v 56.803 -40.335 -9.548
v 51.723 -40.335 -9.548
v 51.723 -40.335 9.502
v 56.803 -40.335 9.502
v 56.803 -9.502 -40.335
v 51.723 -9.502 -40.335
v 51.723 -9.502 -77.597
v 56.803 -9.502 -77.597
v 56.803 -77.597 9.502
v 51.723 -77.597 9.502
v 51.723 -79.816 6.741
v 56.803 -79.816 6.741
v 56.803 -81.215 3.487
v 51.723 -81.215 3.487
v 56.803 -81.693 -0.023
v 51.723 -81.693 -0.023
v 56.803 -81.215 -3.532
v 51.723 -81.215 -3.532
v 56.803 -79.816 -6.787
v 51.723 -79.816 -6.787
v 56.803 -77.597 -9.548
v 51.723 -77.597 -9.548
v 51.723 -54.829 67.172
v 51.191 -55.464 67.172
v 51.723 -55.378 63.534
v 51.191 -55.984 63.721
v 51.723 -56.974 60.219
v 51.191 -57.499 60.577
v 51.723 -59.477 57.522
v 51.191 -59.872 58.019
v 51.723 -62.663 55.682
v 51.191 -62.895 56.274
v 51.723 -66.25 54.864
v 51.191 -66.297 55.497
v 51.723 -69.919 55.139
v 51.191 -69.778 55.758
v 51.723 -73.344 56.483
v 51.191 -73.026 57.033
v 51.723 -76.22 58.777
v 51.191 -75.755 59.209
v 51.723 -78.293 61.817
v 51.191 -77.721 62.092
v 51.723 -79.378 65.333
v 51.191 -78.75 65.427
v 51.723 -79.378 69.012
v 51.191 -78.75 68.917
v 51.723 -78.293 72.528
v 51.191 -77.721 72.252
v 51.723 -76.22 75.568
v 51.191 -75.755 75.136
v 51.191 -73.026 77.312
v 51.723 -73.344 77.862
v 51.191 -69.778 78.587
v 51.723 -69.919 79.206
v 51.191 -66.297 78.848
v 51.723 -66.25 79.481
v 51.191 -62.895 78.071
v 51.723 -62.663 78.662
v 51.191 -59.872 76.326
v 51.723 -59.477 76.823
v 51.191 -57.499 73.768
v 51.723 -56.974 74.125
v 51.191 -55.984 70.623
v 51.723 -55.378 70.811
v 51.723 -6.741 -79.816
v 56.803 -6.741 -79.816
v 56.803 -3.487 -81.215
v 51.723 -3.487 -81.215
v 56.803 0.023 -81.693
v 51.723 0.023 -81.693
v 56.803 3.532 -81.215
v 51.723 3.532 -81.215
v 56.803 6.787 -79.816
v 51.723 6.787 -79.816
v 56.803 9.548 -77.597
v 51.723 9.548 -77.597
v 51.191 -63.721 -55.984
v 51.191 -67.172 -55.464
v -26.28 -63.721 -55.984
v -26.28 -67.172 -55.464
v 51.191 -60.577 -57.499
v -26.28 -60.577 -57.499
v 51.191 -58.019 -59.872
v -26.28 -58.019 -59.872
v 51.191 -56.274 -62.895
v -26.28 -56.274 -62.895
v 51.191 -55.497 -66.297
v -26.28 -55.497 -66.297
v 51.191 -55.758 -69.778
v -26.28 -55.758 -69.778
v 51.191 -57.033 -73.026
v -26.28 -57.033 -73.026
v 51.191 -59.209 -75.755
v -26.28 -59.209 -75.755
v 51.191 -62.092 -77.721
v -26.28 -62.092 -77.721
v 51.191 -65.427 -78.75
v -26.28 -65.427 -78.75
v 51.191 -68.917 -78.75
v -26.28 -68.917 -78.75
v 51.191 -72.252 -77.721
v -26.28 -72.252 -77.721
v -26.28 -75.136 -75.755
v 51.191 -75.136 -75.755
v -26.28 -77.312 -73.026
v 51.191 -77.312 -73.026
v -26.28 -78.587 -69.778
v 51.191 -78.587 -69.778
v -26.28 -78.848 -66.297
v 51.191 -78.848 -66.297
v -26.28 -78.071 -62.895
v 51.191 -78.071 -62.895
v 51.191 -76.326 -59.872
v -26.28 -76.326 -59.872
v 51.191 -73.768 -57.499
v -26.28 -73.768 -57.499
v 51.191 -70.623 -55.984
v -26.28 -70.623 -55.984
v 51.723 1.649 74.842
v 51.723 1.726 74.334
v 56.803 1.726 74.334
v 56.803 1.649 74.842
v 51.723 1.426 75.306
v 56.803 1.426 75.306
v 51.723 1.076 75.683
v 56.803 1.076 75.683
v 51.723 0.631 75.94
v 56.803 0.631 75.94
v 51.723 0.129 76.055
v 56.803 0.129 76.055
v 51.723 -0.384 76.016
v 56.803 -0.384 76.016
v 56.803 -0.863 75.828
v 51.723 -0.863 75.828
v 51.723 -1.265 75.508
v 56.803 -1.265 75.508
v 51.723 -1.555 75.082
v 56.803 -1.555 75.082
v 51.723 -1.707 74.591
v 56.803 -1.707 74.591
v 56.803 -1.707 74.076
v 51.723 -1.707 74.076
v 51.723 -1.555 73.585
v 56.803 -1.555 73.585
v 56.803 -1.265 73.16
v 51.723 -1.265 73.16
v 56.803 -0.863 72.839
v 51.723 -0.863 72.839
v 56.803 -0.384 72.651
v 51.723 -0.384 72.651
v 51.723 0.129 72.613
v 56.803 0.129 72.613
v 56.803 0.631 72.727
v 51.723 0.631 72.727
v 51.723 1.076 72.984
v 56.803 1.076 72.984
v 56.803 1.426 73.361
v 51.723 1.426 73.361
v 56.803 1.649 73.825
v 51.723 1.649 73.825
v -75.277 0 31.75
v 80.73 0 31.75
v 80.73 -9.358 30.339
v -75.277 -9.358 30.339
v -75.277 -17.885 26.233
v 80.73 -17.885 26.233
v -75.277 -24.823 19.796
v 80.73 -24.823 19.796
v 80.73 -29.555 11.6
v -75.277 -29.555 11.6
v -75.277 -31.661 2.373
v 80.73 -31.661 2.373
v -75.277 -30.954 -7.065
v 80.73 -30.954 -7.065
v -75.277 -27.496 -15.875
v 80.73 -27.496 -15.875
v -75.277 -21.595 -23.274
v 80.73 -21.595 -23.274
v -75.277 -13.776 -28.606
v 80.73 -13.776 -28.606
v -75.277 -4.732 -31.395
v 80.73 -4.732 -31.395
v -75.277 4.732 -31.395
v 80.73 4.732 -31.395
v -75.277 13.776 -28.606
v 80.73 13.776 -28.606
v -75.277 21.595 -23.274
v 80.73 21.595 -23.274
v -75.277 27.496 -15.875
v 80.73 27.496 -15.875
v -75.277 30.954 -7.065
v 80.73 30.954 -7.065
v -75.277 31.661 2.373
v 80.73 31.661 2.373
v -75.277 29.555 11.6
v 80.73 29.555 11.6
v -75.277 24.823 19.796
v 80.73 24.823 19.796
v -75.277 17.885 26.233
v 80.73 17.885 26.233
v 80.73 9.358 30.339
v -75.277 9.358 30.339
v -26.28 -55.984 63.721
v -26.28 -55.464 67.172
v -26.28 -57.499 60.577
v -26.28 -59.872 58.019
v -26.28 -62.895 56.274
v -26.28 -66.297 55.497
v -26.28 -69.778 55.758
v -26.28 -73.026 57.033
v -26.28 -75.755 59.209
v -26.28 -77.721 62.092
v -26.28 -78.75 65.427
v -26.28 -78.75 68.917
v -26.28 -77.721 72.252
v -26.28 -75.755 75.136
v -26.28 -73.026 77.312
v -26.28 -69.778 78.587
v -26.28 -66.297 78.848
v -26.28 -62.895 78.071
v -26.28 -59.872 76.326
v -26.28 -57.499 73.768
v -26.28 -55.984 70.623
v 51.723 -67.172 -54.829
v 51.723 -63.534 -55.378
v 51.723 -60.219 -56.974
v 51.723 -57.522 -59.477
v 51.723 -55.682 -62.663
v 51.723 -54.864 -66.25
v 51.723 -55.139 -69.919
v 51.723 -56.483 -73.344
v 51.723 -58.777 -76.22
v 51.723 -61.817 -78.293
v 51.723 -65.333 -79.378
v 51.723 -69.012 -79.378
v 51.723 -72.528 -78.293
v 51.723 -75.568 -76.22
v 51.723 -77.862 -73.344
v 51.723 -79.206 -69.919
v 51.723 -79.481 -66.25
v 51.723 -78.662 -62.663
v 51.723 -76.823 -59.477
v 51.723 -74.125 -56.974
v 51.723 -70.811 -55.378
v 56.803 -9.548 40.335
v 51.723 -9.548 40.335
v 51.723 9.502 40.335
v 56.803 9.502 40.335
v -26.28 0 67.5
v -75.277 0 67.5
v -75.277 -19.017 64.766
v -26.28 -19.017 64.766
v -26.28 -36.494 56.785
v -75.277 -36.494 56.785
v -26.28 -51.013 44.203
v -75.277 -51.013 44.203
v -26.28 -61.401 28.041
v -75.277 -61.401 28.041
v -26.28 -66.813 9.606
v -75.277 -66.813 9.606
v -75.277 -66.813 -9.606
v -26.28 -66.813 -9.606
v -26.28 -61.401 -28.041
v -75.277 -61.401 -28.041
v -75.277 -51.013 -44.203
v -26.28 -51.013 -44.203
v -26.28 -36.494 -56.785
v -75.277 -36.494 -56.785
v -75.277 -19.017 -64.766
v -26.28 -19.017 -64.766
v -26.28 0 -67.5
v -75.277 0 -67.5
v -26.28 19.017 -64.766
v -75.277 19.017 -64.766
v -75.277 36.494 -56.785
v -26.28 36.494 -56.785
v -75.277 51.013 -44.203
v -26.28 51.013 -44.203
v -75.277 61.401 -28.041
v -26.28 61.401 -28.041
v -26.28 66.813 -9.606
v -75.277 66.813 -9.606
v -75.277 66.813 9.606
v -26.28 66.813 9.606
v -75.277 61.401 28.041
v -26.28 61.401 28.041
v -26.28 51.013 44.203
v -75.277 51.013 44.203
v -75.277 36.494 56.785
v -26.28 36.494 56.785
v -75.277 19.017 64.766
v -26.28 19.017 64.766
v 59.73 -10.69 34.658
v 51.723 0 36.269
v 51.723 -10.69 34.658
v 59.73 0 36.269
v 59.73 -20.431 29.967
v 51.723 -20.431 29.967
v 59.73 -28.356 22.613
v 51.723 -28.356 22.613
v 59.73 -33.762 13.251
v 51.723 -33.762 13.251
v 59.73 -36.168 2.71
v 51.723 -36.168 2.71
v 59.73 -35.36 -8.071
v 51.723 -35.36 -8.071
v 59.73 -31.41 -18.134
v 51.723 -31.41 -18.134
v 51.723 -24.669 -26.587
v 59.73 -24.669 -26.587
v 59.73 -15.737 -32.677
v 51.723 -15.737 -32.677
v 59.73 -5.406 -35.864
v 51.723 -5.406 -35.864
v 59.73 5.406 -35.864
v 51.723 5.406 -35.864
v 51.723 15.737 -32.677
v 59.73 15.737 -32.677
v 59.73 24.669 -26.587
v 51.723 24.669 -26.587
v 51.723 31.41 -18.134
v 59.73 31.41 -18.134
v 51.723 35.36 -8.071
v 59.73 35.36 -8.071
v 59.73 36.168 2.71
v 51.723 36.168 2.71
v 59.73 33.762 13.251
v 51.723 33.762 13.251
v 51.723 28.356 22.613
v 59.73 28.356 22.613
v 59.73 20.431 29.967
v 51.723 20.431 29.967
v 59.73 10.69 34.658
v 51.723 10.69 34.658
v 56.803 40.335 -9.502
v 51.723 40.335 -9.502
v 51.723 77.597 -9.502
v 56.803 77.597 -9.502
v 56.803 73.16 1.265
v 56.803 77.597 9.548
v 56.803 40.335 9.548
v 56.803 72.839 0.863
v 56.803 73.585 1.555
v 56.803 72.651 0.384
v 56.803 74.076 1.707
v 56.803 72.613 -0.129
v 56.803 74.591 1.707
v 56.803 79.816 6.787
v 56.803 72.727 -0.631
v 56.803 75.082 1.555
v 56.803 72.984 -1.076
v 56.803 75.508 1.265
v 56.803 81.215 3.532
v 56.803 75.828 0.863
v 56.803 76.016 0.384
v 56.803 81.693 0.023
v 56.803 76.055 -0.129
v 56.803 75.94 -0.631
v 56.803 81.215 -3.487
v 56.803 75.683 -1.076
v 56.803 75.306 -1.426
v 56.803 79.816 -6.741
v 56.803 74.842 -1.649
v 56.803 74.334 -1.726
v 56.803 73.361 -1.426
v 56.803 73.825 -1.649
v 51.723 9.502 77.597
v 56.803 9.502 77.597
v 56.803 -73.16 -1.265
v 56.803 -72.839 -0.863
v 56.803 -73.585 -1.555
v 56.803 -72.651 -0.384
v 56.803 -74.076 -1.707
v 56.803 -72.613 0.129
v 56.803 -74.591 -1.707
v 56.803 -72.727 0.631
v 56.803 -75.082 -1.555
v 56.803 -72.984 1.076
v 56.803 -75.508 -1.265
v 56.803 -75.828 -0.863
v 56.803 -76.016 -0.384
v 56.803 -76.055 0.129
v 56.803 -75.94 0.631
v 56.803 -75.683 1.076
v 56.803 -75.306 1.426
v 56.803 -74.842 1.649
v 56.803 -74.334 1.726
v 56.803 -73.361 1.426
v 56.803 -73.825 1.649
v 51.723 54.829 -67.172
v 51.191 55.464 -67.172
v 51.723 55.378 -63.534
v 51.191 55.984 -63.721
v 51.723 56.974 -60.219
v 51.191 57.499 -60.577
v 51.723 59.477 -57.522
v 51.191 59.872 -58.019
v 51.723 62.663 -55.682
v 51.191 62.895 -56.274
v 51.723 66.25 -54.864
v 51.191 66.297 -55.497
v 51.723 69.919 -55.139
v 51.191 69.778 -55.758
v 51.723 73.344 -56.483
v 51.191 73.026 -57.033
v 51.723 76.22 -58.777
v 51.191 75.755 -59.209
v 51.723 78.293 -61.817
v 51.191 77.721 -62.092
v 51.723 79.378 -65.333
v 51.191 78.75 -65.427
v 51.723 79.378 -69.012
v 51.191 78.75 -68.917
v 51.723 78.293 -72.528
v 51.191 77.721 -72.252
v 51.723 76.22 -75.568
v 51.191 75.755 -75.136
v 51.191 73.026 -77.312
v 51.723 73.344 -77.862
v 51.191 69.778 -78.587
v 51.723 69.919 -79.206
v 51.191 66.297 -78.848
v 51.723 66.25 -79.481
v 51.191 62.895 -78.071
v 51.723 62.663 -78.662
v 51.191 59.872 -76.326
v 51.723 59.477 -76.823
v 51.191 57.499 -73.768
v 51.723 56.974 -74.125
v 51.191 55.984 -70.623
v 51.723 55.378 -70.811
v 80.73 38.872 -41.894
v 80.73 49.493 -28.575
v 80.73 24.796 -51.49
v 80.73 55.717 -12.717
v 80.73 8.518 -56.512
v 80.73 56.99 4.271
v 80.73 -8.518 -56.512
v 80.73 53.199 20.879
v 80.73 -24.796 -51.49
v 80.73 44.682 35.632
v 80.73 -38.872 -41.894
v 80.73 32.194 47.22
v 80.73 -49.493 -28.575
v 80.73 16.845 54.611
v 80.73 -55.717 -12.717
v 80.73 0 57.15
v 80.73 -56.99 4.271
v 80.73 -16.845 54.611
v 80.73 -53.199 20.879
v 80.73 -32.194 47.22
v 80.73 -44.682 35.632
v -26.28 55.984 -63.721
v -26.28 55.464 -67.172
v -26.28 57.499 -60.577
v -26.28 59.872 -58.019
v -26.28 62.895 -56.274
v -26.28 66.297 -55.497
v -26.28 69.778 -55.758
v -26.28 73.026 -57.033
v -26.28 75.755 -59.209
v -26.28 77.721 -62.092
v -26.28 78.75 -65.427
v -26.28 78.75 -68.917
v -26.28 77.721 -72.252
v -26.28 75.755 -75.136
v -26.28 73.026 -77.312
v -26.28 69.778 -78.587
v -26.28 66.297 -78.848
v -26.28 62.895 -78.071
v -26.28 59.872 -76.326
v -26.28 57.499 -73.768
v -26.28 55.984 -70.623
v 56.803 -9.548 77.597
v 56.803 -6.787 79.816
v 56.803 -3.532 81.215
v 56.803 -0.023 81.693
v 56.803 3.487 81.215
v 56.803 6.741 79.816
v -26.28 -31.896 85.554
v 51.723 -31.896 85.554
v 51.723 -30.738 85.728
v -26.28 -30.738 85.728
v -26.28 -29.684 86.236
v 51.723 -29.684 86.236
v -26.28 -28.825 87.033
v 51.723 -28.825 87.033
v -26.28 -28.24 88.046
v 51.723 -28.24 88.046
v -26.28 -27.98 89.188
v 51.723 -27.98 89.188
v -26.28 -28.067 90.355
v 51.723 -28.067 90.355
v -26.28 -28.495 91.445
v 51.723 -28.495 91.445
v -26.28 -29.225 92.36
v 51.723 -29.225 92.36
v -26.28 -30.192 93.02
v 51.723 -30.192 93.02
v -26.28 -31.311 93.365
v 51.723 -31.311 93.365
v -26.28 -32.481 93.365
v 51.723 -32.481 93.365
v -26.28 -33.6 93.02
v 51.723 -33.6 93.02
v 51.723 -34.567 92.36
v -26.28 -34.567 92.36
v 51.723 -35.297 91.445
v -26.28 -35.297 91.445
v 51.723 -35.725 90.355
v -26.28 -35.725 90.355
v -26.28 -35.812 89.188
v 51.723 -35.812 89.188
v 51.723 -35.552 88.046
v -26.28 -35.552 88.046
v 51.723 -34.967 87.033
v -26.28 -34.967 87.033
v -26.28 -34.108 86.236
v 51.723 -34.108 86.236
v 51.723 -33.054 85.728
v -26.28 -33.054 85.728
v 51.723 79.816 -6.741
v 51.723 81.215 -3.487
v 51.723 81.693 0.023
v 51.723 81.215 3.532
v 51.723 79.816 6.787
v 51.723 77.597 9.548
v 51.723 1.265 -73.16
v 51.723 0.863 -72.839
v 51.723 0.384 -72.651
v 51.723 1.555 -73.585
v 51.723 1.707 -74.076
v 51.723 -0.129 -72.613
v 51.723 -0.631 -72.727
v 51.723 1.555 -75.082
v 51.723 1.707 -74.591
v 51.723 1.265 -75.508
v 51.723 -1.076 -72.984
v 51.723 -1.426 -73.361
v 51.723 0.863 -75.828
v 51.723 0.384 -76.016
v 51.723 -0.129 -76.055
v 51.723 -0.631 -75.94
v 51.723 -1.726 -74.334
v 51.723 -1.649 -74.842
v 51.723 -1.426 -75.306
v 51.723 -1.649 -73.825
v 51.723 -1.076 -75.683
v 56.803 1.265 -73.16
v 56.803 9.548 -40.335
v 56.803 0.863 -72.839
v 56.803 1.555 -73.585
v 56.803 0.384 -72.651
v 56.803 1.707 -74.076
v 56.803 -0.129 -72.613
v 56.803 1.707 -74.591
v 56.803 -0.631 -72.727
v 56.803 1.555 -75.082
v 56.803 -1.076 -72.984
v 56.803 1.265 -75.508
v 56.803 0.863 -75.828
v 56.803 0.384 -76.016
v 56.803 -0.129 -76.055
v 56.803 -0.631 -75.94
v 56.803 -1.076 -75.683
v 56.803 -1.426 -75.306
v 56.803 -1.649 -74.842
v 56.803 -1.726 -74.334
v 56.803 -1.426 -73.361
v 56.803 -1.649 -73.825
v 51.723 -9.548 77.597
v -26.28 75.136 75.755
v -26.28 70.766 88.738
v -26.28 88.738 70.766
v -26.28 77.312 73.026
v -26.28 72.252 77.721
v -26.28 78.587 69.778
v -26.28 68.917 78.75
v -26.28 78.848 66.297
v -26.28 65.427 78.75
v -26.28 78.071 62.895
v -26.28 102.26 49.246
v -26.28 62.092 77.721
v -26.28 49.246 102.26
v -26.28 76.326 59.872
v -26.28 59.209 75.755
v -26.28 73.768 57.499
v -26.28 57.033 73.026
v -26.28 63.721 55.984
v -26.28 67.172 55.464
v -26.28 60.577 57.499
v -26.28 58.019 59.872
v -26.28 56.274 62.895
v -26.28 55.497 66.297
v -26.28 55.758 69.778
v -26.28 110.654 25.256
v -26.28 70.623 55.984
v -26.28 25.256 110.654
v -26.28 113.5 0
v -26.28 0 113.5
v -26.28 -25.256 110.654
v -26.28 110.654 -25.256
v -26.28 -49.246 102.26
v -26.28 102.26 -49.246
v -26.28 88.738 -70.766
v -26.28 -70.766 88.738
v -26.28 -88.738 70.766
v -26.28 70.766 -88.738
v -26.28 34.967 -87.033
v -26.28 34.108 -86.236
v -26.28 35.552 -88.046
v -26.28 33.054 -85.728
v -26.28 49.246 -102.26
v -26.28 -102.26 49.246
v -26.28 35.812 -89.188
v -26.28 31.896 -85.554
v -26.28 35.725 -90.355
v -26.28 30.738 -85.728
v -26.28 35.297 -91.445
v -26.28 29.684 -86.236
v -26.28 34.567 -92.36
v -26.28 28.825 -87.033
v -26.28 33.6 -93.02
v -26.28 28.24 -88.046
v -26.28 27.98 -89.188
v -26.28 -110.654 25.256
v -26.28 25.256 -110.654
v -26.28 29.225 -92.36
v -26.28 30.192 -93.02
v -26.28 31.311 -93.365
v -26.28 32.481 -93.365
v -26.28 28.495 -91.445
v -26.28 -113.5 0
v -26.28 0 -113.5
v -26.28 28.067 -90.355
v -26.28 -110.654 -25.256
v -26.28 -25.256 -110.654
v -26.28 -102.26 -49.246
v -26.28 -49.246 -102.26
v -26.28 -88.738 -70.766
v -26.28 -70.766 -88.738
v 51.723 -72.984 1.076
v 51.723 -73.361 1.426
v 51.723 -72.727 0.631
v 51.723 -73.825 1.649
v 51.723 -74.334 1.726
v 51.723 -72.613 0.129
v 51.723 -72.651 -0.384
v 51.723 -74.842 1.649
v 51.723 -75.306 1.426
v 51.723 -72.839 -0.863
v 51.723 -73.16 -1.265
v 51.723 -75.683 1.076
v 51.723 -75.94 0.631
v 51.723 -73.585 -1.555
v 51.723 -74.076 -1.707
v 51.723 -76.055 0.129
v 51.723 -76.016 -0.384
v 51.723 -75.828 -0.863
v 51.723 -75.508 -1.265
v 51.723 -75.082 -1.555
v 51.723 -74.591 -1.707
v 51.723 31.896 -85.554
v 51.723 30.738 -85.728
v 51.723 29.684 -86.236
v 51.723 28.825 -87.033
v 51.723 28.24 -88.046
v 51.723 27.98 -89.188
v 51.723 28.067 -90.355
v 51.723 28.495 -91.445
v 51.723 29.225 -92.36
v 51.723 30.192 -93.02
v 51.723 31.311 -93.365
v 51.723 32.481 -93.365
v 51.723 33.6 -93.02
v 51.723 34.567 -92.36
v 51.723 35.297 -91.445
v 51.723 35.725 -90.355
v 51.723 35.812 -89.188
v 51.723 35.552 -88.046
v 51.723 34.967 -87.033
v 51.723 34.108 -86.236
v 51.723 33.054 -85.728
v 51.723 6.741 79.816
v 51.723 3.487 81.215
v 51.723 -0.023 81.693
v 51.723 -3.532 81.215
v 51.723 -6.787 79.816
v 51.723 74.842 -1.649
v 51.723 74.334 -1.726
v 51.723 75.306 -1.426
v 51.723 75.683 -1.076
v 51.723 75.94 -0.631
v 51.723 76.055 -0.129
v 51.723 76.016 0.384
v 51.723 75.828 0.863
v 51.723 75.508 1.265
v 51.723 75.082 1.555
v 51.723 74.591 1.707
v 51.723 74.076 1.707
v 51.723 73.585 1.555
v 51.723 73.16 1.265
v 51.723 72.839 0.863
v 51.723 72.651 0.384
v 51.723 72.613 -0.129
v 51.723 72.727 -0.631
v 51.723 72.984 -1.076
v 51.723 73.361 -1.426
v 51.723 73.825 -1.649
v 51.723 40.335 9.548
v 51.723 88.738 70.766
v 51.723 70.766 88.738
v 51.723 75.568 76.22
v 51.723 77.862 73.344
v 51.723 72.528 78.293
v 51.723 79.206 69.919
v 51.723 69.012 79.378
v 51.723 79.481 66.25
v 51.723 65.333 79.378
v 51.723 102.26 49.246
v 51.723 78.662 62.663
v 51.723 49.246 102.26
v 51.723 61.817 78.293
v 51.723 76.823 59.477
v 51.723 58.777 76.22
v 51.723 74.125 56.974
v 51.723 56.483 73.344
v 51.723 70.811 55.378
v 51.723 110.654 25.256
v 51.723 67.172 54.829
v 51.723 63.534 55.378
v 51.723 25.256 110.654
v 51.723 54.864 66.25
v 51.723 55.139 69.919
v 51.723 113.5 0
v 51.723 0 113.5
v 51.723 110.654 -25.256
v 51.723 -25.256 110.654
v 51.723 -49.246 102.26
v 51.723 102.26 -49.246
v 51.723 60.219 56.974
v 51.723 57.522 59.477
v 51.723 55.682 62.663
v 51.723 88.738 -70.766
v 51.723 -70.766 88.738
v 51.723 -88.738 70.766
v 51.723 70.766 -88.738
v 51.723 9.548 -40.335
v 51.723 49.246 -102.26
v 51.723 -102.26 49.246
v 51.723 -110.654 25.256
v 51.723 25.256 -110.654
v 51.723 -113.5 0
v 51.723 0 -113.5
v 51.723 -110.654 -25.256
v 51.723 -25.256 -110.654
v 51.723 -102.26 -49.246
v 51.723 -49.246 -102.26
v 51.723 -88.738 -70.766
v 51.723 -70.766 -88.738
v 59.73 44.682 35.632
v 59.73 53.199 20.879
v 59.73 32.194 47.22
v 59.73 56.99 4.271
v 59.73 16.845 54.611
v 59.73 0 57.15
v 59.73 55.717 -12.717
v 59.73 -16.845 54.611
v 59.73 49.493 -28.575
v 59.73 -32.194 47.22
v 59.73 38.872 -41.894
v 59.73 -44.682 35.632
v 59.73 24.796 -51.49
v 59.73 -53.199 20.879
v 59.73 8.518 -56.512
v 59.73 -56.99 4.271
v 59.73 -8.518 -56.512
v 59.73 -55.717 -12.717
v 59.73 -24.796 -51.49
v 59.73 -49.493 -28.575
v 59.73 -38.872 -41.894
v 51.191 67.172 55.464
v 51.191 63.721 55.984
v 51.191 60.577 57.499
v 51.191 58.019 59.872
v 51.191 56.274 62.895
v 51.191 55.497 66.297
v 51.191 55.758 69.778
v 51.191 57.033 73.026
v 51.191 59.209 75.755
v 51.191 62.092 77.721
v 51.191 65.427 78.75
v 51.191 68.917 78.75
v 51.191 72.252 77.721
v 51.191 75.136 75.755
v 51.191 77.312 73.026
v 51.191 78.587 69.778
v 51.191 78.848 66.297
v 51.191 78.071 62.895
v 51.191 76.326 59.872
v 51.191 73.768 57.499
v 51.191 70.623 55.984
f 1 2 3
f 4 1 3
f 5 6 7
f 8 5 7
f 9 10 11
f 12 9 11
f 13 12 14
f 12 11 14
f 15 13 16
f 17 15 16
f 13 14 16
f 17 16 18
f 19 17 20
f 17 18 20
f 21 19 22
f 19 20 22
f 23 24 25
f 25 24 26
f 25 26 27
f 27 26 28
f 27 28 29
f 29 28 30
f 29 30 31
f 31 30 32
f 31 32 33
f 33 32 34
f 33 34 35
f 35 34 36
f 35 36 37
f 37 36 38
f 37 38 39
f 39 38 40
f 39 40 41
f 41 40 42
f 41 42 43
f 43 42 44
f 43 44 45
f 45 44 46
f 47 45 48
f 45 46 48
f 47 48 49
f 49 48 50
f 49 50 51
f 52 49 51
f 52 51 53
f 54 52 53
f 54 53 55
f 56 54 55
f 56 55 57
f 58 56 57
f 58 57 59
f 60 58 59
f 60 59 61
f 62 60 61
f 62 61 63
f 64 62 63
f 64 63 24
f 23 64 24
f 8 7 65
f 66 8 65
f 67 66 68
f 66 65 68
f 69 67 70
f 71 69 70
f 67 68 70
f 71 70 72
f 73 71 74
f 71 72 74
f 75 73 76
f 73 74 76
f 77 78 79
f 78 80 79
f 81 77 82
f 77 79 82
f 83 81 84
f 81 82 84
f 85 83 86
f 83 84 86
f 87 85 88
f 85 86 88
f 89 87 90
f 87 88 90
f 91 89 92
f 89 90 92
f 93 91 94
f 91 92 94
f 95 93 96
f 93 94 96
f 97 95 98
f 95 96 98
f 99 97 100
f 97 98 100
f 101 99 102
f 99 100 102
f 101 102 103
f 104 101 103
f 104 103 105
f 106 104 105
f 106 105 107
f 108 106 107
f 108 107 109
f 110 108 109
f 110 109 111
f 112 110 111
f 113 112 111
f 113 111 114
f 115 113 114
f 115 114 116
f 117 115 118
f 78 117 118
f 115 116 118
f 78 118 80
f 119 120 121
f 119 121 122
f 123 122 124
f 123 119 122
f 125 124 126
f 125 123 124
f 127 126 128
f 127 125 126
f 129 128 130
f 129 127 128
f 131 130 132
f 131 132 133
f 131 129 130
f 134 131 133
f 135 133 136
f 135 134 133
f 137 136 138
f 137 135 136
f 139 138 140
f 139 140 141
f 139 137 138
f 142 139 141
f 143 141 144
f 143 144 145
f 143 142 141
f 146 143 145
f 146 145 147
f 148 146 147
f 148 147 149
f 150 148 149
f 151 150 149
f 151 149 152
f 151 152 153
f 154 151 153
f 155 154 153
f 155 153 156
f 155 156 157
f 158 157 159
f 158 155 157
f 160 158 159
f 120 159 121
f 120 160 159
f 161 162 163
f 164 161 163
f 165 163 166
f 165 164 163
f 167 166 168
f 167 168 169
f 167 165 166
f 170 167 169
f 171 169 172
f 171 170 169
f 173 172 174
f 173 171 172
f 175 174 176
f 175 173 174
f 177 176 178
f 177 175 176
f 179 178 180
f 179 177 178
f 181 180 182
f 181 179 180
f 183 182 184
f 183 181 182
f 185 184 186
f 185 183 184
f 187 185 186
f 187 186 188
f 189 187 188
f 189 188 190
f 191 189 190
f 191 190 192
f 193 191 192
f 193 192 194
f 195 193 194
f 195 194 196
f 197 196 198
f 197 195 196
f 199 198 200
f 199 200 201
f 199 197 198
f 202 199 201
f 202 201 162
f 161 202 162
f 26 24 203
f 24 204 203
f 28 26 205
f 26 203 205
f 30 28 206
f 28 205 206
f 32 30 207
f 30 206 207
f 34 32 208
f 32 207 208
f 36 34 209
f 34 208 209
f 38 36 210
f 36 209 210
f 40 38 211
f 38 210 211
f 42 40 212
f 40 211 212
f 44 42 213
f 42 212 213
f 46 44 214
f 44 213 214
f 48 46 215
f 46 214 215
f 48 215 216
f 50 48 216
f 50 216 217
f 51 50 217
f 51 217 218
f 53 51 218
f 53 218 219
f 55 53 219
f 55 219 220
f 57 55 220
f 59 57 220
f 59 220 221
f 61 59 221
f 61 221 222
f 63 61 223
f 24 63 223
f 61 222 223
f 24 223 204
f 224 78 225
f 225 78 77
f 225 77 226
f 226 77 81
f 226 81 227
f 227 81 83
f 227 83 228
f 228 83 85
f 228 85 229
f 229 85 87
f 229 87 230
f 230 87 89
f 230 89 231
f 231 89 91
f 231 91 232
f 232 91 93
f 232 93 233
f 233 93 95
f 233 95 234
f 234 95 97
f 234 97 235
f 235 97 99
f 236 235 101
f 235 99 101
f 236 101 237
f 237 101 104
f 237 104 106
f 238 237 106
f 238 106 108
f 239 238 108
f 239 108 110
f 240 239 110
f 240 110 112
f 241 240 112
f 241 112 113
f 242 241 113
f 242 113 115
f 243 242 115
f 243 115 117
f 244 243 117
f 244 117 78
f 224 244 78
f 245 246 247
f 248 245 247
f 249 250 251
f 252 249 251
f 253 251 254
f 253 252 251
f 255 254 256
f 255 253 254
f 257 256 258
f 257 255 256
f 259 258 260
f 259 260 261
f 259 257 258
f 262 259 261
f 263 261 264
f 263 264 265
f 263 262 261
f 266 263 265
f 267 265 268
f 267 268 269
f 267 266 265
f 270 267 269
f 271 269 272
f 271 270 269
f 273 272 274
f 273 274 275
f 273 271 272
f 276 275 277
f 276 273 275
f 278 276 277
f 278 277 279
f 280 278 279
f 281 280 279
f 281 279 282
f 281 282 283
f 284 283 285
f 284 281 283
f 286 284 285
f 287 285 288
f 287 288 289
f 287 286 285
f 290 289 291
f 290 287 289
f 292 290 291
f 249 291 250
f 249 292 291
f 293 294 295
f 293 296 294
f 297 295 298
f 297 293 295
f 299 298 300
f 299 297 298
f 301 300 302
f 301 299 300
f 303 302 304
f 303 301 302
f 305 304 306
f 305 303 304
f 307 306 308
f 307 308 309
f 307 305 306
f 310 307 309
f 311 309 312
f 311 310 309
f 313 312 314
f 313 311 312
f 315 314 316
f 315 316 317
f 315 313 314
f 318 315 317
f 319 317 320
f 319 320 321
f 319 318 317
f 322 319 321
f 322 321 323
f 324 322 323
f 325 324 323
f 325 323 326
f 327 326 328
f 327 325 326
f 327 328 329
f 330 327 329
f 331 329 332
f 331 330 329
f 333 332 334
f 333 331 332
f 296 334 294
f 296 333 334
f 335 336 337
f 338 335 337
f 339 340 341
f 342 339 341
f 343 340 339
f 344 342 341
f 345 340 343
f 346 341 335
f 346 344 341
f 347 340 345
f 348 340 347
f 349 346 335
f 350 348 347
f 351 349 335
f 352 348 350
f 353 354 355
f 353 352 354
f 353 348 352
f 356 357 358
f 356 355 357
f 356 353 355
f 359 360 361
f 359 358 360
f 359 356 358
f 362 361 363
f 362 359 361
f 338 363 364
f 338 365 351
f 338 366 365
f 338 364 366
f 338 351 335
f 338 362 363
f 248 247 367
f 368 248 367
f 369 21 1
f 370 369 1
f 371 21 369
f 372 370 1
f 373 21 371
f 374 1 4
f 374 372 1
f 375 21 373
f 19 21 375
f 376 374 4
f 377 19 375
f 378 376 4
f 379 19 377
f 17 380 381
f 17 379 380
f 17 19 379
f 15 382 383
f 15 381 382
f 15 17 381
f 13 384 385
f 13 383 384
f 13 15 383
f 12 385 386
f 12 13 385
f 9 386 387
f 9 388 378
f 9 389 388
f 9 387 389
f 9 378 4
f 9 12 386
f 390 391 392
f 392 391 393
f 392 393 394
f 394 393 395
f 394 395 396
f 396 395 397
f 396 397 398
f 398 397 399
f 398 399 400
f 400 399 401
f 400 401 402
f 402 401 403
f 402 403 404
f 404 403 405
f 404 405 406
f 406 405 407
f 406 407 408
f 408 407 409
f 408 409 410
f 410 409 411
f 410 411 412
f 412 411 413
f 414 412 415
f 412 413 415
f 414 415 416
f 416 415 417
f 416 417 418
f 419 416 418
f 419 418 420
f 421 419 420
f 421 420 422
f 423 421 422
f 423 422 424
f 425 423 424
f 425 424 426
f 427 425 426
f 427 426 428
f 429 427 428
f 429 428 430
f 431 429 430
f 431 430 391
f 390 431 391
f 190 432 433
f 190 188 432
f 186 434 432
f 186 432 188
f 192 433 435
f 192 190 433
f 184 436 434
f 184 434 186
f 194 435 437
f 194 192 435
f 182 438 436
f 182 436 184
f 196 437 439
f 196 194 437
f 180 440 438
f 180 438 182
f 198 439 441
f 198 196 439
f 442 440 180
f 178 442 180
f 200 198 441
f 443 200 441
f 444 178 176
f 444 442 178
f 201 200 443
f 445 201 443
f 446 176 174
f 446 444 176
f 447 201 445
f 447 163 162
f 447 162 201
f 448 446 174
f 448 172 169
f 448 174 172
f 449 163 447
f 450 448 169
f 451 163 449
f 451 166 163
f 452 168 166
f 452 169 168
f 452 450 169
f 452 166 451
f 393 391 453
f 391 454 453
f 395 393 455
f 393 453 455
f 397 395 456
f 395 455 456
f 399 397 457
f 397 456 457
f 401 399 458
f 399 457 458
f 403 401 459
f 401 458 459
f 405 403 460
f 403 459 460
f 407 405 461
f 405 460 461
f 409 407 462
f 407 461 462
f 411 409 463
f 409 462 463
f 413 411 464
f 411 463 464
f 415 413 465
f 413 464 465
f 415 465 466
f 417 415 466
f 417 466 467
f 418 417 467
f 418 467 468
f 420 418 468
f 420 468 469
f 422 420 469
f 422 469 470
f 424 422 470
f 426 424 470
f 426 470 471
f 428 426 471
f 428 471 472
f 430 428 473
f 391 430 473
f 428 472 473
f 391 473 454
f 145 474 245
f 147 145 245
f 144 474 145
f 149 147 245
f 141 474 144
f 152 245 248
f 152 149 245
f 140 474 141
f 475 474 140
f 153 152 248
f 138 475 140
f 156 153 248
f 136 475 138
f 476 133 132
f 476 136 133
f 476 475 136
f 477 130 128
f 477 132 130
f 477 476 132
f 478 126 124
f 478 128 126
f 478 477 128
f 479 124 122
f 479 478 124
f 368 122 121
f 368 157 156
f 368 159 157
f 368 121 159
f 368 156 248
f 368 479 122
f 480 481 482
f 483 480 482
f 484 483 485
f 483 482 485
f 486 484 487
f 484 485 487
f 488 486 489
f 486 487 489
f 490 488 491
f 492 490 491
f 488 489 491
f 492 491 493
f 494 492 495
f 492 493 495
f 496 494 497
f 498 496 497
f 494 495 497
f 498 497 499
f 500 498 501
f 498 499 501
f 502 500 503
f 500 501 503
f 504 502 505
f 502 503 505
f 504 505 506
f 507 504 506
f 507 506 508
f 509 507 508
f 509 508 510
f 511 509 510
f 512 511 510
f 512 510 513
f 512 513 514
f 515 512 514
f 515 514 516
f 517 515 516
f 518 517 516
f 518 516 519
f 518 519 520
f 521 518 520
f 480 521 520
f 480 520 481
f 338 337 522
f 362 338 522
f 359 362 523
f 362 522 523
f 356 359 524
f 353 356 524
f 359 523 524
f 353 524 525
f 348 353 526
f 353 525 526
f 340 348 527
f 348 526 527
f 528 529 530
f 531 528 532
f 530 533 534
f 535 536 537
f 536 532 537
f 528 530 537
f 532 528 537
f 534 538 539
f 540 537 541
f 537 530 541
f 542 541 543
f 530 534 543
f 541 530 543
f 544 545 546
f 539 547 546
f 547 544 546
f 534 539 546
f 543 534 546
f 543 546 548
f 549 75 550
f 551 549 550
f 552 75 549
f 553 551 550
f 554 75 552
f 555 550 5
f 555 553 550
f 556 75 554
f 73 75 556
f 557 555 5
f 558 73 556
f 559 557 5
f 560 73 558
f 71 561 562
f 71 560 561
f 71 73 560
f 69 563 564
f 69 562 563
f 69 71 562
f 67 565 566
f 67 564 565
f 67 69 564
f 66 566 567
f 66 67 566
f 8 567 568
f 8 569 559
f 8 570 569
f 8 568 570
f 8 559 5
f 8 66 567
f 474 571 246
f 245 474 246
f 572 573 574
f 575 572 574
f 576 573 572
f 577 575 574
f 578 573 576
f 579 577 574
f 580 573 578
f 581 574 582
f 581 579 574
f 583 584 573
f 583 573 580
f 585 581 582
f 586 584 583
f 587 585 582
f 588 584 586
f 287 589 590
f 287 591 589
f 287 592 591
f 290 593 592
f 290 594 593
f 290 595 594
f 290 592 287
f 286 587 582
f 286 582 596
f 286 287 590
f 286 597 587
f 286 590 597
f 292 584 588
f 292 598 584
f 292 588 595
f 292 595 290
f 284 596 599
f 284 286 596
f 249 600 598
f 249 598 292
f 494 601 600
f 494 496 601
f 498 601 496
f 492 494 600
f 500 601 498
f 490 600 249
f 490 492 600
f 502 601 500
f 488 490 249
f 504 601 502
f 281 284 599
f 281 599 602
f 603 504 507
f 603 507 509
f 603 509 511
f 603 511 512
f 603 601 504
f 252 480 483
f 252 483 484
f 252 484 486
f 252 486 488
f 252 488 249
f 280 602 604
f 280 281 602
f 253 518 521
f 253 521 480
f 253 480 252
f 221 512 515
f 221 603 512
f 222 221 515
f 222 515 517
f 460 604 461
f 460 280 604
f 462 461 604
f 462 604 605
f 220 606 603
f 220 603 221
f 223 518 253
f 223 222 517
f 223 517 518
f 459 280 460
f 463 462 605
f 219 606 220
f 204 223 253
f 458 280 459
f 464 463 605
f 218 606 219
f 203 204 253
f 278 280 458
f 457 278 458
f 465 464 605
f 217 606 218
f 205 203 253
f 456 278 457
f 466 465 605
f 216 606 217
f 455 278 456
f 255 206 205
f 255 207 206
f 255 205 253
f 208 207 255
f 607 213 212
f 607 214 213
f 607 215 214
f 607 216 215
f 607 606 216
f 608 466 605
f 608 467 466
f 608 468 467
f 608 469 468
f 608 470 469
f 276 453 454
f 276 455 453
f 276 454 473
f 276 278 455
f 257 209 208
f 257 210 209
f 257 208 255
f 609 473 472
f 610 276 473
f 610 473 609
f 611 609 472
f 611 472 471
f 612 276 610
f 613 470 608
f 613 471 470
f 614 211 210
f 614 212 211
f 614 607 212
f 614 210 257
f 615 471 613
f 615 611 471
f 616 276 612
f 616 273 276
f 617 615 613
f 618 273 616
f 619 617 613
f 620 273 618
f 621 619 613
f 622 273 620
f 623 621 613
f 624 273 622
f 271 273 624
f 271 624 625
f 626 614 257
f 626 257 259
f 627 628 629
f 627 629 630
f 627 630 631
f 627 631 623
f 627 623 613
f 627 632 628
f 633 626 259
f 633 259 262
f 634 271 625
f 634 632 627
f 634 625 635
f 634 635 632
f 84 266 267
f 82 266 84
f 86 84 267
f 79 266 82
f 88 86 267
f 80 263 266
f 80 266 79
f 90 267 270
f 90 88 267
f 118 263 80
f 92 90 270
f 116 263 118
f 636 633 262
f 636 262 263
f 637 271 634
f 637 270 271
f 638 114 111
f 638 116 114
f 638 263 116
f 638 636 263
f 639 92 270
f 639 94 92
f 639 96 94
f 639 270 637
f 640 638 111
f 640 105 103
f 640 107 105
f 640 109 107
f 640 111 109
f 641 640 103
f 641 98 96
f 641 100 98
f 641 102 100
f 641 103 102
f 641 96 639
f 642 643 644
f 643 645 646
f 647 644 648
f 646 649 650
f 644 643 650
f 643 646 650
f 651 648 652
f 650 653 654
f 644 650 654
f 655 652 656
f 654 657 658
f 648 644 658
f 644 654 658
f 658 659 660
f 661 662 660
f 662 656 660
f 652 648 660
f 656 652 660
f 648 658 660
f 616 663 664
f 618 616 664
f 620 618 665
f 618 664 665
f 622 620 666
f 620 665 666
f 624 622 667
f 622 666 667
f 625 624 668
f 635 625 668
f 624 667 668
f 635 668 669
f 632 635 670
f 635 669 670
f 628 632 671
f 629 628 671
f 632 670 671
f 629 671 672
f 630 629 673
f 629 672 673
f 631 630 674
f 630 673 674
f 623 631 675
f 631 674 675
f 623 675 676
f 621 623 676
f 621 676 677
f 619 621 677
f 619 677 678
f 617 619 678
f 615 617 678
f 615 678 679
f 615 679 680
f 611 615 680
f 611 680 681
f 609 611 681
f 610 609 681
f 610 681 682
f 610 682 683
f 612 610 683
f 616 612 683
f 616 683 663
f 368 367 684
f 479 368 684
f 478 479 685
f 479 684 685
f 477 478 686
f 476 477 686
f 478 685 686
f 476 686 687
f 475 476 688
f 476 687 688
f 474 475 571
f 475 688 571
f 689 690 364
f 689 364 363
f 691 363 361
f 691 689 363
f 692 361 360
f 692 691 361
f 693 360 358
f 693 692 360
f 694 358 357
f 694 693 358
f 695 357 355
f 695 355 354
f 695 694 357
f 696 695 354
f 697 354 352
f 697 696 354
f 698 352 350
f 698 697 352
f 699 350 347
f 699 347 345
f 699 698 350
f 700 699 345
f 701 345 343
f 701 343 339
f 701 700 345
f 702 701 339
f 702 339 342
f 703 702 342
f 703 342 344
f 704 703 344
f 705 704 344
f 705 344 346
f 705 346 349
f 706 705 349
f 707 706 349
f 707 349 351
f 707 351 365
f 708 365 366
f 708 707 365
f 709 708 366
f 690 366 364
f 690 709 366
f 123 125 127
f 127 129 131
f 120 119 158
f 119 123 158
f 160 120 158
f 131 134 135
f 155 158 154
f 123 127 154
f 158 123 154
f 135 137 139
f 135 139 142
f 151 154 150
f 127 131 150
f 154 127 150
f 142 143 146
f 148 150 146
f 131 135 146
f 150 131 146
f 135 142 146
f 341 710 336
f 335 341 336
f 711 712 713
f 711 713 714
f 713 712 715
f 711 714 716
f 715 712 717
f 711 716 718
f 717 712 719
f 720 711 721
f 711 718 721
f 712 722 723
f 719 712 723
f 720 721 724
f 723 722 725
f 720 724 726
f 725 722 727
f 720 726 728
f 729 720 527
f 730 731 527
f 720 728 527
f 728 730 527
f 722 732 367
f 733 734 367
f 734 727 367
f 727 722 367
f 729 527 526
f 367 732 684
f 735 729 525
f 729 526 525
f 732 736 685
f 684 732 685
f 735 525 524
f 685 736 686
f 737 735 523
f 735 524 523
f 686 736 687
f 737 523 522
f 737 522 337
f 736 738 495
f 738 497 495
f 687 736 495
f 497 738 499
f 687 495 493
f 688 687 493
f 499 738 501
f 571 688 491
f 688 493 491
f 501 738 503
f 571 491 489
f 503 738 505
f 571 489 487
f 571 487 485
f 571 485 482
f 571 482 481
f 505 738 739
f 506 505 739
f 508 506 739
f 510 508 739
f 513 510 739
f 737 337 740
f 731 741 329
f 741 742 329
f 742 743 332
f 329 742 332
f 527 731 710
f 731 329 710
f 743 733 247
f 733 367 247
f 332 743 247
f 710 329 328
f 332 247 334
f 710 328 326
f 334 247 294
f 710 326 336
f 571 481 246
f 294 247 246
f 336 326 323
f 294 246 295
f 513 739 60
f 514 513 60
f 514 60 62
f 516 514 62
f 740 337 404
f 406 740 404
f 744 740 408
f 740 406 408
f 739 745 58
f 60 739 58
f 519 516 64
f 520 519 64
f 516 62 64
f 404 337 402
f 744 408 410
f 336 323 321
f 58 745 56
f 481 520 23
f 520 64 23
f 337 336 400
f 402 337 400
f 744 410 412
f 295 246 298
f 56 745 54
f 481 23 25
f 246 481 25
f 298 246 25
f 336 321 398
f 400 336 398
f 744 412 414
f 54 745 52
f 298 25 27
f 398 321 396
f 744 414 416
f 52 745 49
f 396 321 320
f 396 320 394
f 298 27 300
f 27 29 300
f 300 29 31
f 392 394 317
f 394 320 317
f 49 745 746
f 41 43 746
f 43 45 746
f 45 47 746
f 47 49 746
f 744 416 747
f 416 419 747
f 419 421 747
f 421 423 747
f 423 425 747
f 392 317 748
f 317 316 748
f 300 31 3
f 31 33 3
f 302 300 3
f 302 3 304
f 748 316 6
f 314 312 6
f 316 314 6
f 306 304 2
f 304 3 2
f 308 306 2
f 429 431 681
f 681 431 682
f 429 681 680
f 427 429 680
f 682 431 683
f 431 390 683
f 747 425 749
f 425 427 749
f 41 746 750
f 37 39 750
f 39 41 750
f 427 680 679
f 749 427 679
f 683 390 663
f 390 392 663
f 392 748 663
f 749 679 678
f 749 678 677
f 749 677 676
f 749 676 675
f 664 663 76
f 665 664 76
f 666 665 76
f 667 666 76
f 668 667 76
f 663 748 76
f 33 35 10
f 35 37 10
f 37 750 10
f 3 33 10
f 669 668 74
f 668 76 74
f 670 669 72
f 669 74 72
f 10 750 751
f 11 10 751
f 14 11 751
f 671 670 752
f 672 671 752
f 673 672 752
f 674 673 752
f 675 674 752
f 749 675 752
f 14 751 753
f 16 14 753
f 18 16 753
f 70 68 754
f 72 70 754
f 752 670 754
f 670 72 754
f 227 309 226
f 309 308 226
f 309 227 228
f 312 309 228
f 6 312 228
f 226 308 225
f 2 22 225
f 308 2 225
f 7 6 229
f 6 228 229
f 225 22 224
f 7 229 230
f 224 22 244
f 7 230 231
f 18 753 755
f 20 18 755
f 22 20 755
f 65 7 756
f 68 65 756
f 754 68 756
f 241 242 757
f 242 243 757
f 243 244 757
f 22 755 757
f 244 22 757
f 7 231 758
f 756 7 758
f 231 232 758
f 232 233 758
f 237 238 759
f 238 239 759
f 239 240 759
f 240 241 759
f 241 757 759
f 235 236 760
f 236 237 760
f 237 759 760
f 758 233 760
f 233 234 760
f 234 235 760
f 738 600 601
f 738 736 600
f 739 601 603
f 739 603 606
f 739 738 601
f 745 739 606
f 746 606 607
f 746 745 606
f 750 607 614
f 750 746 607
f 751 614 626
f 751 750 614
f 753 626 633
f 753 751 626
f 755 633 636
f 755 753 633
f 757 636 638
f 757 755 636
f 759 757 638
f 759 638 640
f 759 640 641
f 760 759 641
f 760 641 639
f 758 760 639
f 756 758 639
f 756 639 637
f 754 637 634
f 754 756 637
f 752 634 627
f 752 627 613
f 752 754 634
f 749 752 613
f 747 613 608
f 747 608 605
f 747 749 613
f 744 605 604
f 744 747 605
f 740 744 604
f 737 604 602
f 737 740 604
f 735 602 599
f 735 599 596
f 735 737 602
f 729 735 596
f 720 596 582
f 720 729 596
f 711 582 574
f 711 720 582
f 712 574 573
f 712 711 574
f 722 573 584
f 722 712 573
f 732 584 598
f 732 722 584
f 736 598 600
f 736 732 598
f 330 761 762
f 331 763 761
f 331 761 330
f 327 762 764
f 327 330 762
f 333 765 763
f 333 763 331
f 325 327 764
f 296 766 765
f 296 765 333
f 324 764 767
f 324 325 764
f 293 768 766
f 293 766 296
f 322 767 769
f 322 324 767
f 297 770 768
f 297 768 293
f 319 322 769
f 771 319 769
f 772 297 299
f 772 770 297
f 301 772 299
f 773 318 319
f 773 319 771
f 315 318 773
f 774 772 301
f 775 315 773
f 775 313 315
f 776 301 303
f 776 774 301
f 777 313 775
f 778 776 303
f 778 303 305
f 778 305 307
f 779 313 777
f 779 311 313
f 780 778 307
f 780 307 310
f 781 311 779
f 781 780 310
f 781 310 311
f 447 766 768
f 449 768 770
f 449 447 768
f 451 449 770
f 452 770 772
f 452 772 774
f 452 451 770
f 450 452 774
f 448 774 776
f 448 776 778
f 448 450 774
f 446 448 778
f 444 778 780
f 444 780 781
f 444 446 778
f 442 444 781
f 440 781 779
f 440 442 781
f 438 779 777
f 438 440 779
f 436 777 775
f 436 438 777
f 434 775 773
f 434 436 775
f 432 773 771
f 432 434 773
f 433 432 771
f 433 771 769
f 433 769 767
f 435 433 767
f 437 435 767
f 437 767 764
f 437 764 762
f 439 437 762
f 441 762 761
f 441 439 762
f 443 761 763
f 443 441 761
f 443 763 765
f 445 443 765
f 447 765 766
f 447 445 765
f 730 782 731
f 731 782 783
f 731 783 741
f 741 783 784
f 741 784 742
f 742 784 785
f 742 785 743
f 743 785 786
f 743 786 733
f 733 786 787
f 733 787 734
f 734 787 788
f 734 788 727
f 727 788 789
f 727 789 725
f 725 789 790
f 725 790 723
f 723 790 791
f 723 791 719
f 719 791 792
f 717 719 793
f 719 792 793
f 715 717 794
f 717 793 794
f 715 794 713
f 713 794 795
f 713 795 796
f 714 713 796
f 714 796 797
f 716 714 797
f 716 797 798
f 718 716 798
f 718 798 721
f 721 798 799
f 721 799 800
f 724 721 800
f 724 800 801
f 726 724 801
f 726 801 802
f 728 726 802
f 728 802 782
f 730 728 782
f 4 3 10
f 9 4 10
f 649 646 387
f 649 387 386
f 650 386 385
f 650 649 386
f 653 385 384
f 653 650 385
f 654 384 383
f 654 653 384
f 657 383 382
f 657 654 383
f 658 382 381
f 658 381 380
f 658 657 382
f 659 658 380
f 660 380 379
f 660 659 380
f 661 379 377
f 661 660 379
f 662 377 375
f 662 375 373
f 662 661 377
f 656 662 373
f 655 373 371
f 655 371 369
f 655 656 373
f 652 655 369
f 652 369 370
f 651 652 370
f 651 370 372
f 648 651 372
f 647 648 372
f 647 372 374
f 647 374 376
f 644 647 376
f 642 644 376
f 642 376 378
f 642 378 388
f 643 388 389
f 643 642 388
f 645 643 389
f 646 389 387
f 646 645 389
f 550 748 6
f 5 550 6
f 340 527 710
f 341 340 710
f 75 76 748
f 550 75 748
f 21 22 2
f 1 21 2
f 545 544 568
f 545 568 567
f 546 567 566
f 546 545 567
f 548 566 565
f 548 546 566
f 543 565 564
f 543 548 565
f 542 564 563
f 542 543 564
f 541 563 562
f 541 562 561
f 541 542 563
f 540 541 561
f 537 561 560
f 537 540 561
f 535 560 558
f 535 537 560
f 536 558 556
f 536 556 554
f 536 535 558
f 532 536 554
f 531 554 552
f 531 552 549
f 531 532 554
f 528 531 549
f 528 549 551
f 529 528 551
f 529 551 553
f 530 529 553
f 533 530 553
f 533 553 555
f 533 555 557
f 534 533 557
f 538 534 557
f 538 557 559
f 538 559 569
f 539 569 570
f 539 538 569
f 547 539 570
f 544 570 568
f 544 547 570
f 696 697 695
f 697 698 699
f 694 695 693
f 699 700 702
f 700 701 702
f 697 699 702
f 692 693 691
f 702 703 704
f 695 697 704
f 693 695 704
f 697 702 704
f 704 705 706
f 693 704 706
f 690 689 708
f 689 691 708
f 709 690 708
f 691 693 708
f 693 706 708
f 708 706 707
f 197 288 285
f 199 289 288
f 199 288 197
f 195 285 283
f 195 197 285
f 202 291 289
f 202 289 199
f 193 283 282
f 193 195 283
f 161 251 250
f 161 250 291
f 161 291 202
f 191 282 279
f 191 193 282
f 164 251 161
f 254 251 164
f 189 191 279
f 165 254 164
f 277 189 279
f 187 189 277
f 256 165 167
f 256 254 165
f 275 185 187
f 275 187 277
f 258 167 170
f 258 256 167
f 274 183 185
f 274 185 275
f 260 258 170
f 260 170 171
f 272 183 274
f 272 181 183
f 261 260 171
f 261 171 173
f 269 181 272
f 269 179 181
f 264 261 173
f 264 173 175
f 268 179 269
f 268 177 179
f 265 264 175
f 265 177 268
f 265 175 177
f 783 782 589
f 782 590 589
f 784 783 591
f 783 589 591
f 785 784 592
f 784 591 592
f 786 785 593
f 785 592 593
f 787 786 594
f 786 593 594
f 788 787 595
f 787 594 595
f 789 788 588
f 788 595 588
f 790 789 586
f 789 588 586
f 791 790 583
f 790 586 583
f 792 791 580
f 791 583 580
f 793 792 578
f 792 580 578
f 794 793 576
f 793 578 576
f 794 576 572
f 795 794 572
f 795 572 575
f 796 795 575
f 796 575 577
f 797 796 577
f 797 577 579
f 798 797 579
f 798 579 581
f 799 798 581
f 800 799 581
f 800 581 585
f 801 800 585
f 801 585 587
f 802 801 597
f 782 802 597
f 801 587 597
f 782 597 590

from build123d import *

# Parameters (mm, degrees)
SKETCH2_R                           = 1.725862242
BOSS_EXTRUDE1_DEPTH                 = 5.08
CIRPATTERN1_COUNT                   = 4
TAP_DRILL_FOR_1_12_TAP1_D           = 23.41626
TAP_DRILL_FOR_1_12_TAP1_CSINK_D     = 24.68626
TAP_DRILL_FOR_1_12_TAP1_CSINK_ANGLE = 100
CIRPATTERN2_COUNT                   = 4
SKETCH4_R                           = 3.927379396
CUT_EXTRUDE1_DEPTH                  = 205.678906094
CIRPATTERN3_COUNT                   = 2


with BuildPart() as part:
    # Sketch1 → Revolve1 (revolve)
    with BuildSketch(Plane.XY, mode=Mode.PRIVATE) as revolve1_sk:
        Polygon((-75.276594545, 31.75), (-75.276594545, 67.5005), (-26.279994545, 67.5005), (-26.279994545, 113.4999), (51.723405455, 113.4999), (51.723405455, 53.34), (51.723405455, 36.268932417), (59.730205455, 36.268932417), (59.730205455, 57.15), (80.730205455, 57.15), (80.730205455, 31.75), align=None)
    revolve(revolve1_sk.sketch.rotate(Axis((-77.058289091, 0, 0), (1, 0, 0)), 90), axis=Axis((-77.058289091, 0, 0), (1, 0, 0)))

    # Sketch2 → Boss-Extrude1 (add)
    with BuildSketch(Plane(origin=(51.723405455, 0, 0), x_dir=(0, 0, -1), z_dir=(1, 0, 0))):
        with BuildLine():
            Line((9.502237171, 69.200650205), (9.502237171, 77.59727245))
            ThreePointArc((9.502237171, 77.59727245), (-0.022762829, 81.693250486), (-9.547762829, 77.59727245))
            Line((-9.547762829, 77.59727245), (-9.547762829, 69.194383623))
            Line((-9.547762829, 69.194383623), (-9.547762829, 40.334566498))
            Line((-9.547762829, 40.334566498), (9.502237171, 40.334566498))
            Line((9.502237171, 40.334566498), (9.502237171, 69.200650205))
        make_face()
        with Locations((0, 74.333669045)):
            Circle(SKETCH2_R, mode=Mode.SUBTRACT)
    boss_extrude1 = extrude(amount=BOSS_EXTRUDE1_DEPTH)

    # CirPattern1: Boss-Extrude1 ×4 about axis
    cirpattern1_axis = Axis((0, 0, 0), (1, 0, 0))
    for i in range(1, CIRPATTERN1_COUNT):
        add(boss_extrude1.rotate(cirpattern1_axis, i * 360 / CIRPATTERN1_COUNT))

    # Tap Drill for 1-12 Tap1 (through all)
    with Locations(Plane(origin=(51.723405455, 67.172315786, 67.172315786), x_dir=(0, 0, 1), z_dir=(1, 0, 0))):
        with Locations((0, 0)):
            tap_drill_for_1_12_tap1 = CounterSinkHole(TAP_DRILL_FOR_1_12_TAP1_D / 2, TAP_DRILL_FOR_1_12_TAP1_CSINK_D / 2, counter_sink_angle=TAP_DRILL_FOR_1_12_TAP1_CSINK_ANGLE)

    # CirPattern2: Tap Drill for 1-12 Tap1 ×4 about axis
    cirpattern2_axis = Axis((0, 0, 0), (1, 0, 0))
    for i in range(1, CIRPATTERN2_COUNT):
        add(tap_drill_for_1_12_tap1.rotate(cirpattern2_axis, i * 360 / CIRPATTERN2_COUNT), mode=Mode.SUBTRACT)

    # Sketch4 → Cut-Extrude1 (cut, through all)
    with BuildSketch(Plane(origin=(51.723405455, 0, 0), x_dir=(0, 0, -1), z_dir=(1, 0, 0))):
        with Locations((-89.48120145, -31.895996663)):
            Circle(SKETCH4_R)
    cut_extrude1 = extrude(amount=-CUT_EXTRUDE1_DEPTH, mode=Mode.SUBTRACT)

    # CirPattern3: Cut-Extrude1 ×2 about axis
    cirpattern3_axis = Axis((0, 0, 0), (1, 0, 0))
    for i in range(1, CIRPATTERN3_COUNT):
        add(cut_extrude1.rotate(cirpattern3_axis, i * 360 / CIRPATTERN3_COUNT), mode=Mode.SUBTRACT)


solid = part.part
